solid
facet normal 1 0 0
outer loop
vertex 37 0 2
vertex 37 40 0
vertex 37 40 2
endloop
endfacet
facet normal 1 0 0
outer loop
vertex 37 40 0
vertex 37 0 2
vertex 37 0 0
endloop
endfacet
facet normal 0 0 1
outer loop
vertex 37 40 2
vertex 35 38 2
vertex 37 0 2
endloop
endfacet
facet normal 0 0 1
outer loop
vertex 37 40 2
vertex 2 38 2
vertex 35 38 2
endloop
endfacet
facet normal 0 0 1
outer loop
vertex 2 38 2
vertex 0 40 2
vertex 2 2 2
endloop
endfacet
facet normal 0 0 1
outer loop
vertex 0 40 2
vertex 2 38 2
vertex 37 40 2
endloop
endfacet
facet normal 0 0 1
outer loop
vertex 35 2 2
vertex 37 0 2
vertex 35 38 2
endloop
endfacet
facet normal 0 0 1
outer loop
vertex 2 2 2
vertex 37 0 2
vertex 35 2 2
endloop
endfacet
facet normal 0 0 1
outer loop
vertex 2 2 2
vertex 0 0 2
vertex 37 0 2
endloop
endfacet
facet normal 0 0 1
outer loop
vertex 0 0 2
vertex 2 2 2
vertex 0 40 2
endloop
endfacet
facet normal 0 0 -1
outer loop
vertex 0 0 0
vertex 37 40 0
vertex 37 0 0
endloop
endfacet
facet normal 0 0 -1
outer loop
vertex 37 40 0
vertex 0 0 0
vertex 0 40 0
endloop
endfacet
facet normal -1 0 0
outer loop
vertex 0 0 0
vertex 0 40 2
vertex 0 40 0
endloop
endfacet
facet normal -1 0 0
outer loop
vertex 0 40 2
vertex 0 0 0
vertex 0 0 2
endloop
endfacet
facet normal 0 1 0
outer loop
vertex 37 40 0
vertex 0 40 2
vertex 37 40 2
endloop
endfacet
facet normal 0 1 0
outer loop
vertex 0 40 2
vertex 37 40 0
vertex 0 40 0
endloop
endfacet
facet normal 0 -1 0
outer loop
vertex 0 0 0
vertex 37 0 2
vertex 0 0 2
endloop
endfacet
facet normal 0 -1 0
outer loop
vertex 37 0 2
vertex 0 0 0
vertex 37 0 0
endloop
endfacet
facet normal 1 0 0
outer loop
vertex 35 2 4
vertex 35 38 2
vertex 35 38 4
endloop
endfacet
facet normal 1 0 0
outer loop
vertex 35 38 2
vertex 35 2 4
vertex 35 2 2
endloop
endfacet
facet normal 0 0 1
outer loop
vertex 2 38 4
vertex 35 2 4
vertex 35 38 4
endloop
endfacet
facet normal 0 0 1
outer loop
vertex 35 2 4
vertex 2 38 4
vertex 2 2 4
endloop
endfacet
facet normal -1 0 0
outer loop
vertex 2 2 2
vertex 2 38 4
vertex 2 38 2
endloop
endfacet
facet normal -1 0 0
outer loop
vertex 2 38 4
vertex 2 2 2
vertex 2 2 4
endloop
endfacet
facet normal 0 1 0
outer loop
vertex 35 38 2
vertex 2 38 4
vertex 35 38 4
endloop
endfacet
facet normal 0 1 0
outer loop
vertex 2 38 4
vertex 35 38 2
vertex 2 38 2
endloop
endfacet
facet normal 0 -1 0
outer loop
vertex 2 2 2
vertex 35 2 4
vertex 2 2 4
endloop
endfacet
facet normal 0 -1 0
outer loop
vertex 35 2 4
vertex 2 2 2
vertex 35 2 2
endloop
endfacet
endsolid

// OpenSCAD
box_thickness=2;

box_hole_width=5;

box_hole_depth=10;

box_inner_dim=[33,36,25];

/* [Hidden] */

$fn = 300;


module lid()
{
    // lid
    union()
    {
        cube([box_inner_dim[0]+box_thickness*2,box_inner_dim[1]+box_thickness*2,box_thickness]);

        translate([box_thickness,box_thickness,0])
        cube([box_inner_dim[0],box_inner_dim[1],box_thickness*2]);
    }
}

// box
module box()
{
    difference()
    {
        // main body
        cube(box_inner_dim+[box_thickness*2,box_thickness*2,box_thickness*2]);

        // cut inside
        translate([box_thickness,box_thickness,box_thickness])
        cube(box_inner_dim+[0,0,box_thickness*2]);
        
        // cut slot for wires
        translate([box_thickness+box_inner_dim[0]/2-box_hole_width/2,-box_thickness,box_thickness*2+box_inner_dim[2]-box_hole_depth])
        cube([box_hole_width,box_inner_dim[1]+box_thickness*4,box_hole_depth+box_thickness]);
    }
    
}

lid();
